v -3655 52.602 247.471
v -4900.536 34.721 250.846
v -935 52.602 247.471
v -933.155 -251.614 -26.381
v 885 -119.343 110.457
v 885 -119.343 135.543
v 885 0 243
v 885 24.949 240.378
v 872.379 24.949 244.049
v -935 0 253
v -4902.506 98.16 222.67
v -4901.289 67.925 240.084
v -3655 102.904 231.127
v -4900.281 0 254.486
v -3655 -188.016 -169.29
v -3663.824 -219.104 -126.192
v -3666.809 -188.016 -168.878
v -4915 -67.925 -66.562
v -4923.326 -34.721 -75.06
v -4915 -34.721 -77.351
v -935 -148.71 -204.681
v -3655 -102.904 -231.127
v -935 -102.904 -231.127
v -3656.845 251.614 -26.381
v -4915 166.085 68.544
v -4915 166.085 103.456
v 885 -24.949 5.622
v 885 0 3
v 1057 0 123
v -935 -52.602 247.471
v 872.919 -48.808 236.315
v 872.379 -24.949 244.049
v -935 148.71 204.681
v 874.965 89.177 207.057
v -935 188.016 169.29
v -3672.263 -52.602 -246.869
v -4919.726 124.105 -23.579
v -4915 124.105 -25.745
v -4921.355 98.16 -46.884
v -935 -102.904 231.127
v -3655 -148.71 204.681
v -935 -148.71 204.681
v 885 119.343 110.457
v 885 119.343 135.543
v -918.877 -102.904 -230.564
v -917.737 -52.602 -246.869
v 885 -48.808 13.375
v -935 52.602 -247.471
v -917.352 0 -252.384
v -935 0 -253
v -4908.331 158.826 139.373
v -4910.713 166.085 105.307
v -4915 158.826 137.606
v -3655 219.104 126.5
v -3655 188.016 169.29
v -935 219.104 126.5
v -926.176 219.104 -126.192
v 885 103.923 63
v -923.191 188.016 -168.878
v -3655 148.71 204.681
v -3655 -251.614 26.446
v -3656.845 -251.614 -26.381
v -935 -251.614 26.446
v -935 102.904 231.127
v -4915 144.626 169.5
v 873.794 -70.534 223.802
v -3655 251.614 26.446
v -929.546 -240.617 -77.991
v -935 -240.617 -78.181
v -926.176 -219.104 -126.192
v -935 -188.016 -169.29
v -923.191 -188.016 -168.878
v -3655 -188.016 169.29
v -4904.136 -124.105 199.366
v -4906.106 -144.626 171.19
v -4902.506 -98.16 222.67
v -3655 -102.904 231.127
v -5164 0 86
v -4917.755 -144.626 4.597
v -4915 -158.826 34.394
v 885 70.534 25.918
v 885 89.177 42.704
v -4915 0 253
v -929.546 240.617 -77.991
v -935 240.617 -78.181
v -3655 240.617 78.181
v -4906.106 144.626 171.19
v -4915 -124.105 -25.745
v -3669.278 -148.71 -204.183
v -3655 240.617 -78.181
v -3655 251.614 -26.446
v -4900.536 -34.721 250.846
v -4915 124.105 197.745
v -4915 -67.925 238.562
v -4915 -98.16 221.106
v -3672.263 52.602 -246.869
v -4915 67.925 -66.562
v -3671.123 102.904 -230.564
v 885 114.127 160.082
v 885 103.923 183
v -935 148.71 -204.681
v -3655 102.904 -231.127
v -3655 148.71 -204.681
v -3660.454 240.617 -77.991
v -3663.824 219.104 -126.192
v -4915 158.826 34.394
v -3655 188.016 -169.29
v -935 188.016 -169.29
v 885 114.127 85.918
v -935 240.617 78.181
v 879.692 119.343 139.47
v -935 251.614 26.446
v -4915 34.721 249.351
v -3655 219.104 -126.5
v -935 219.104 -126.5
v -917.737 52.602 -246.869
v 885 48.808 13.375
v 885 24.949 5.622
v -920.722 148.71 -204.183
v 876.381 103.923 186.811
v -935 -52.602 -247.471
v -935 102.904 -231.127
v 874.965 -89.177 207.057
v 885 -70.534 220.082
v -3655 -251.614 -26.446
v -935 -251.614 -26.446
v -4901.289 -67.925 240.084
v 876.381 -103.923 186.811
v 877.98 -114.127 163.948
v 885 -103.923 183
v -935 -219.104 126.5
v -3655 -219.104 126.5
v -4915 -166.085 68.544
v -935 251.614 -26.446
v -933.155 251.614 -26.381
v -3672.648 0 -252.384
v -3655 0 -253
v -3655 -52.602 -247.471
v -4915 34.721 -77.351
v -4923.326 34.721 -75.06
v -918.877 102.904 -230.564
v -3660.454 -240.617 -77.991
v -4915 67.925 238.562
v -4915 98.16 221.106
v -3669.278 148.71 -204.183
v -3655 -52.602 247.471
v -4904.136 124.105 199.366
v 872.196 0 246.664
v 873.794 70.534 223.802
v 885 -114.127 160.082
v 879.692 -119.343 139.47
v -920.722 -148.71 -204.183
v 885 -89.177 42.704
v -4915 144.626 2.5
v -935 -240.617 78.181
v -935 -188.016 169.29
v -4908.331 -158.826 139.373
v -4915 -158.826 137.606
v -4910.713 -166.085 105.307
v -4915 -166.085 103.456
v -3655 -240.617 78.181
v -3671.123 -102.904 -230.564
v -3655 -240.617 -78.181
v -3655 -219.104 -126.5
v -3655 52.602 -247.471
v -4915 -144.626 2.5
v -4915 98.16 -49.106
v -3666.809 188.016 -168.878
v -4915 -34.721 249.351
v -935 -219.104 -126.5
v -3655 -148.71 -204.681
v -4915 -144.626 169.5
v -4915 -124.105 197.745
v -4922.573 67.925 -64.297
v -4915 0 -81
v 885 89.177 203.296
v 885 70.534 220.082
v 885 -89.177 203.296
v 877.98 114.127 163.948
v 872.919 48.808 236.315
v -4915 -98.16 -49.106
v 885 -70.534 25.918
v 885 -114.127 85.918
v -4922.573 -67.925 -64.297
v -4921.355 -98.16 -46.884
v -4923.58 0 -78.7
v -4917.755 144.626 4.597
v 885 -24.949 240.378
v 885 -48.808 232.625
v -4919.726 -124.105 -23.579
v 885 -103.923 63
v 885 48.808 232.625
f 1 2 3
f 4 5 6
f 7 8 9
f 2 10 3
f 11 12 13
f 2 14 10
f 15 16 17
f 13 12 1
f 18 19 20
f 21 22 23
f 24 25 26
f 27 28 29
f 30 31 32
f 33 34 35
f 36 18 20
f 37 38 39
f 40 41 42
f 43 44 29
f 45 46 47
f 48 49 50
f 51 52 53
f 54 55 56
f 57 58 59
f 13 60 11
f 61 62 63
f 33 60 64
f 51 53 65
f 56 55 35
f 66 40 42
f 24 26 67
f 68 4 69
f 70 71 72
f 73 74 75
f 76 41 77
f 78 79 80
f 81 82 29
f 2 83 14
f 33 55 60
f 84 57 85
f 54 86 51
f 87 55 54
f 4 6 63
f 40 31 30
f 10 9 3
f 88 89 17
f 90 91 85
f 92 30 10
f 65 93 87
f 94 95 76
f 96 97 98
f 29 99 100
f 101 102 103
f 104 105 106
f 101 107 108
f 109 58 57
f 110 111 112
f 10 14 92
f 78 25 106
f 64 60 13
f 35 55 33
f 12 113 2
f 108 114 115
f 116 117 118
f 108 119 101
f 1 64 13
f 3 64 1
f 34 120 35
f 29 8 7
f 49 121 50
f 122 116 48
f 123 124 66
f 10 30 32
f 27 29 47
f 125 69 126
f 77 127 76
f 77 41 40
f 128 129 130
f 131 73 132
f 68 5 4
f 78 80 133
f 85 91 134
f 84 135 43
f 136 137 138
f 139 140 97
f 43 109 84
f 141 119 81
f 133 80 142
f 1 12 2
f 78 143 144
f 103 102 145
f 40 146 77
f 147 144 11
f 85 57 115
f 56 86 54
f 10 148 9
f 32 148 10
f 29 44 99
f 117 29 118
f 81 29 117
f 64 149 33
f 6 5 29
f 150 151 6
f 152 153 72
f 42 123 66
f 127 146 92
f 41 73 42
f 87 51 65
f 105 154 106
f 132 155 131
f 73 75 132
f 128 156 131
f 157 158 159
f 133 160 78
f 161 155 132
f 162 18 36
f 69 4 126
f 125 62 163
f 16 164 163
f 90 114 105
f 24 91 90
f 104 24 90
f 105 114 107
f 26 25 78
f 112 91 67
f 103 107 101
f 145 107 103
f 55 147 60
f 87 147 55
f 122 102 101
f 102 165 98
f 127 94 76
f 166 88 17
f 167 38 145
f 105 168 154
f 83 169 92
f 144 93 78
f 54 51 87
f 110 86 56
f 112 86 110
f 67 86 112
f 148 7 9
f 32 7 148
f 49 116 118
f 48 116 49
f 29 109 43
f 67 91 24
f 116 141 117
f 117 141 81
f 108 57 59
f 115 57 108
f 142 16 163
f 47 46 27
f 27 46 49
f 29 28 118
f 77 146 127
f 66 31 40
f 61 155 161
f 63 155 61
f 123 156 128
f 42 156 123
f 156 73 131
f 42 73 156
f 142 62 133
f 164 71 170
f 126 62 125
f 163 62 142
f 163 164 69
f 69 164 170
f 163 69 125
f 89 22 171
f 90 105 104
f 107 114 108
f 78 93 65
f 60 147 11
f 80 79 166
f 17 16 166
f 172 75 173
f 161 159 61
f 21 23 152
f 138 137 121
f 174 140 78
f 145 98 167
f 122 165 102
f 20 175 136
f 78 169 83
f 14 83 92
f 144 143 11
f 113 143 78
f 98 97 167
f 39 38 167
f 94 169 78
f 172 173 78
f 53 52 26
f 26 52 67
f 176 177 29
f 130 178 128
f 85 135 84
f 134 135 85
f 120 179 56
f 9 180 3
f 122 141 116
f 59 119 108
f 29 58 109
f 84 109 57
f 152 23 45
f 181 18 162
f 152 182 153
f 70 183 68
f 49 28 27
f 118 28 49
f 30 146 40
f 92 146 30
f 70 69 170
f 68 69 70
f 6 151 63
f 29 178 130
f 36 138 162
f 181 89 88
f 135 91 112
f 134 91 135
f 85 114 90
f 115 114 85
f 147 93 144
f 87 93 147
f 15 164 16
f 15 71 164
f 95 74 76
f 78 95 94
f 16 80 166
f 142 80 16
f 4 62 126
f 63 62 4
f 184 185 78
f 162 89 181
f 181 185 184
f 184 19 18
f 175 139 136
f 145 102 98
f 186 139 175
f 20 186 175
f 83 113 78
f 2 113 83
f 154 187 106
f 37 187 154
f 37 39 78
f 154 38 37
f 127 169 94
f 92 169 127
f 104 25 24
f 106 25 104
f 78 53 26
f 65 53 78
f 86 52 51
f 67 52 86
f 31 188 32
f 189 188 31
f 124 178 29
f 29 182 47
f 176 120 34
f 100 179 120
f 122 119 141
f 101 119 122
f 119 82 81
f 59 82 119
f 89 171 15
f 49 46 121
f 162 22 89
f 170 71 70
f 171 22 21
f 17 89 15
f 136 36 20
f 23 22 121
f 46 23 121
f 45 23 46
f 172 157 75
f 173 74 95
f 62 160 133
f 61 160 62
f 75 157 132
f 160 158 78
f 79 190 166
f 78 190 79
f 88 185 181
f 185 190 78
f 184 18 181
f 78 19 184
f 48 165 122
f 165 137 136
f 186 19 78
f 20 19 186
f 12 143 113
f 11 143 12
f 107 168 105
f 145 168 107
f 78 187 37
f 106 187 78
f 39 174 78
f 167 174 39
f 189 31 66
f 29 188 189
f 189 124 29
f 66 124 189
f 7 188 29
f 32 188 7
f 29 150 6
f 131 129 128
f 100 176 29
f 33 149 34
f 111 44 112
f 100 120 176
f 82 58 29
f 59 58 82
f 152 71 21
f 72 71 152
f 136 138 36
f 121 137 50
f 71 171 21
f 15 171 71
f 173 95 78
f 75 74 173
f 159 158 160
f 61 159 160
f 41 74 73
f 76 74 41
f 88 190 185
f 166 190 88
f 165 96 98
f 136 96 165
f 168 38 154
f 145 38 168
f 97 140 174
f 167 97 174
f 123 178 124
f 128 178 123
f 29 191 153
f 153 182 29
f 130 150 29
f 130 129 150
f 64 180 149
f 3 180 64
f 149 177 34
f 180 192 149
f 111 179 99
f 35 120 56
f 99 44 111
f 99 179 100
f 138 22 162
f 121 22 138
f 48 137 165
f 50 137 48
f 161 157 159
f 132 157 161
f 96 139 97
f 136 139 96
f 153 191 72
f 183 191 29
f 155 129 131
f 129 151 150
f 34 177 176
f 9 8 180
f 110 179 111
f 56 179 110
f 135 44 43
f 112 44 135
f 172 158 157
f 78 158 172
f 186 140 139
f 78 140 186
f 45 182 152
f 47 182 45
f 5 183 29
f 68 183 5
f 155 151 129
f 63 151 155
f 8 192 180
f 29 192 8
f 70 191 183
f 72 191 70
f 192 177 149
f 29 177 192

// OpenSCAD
Ballon50();
module Ballon50(){
    
    cylLen = 2720; //435; //3450;
    dia = 506;
    dx = 935;
    dx1 = 935-1820;
    dfront = 240;
    hfront = 172;
    drear = 334;
    dx2 = dx+cylLen;
    

    hull(){
    
        translate([-dx,0,0]) 
        rotate([0,-90,0])    
        cylinder(d=dia,h=cylLen);

        translate([-dx,0,0]) 
        rotate([0,86,0]) 
        cylinder(d1=dia, d2=dfront,h=1820);

        translate([-dx1,0,(dia/2 - dfront/2)-10]) 
        rotate([0,90,0]) 
        cylinder(d1 = dfront,d2=0, h=172);

     
        translate([-dx2,0,0]) 
        rotate([0,-86,0]) 
        cylinder(d1=dia, d2=drear,h=1260);


        translate([-dx2-1260,0,(dia/2 - drear/2)]) 
        rotate([0,-90,0]) 
        cylinder(d1 = drear,d2=0, h=249);

    }
}
